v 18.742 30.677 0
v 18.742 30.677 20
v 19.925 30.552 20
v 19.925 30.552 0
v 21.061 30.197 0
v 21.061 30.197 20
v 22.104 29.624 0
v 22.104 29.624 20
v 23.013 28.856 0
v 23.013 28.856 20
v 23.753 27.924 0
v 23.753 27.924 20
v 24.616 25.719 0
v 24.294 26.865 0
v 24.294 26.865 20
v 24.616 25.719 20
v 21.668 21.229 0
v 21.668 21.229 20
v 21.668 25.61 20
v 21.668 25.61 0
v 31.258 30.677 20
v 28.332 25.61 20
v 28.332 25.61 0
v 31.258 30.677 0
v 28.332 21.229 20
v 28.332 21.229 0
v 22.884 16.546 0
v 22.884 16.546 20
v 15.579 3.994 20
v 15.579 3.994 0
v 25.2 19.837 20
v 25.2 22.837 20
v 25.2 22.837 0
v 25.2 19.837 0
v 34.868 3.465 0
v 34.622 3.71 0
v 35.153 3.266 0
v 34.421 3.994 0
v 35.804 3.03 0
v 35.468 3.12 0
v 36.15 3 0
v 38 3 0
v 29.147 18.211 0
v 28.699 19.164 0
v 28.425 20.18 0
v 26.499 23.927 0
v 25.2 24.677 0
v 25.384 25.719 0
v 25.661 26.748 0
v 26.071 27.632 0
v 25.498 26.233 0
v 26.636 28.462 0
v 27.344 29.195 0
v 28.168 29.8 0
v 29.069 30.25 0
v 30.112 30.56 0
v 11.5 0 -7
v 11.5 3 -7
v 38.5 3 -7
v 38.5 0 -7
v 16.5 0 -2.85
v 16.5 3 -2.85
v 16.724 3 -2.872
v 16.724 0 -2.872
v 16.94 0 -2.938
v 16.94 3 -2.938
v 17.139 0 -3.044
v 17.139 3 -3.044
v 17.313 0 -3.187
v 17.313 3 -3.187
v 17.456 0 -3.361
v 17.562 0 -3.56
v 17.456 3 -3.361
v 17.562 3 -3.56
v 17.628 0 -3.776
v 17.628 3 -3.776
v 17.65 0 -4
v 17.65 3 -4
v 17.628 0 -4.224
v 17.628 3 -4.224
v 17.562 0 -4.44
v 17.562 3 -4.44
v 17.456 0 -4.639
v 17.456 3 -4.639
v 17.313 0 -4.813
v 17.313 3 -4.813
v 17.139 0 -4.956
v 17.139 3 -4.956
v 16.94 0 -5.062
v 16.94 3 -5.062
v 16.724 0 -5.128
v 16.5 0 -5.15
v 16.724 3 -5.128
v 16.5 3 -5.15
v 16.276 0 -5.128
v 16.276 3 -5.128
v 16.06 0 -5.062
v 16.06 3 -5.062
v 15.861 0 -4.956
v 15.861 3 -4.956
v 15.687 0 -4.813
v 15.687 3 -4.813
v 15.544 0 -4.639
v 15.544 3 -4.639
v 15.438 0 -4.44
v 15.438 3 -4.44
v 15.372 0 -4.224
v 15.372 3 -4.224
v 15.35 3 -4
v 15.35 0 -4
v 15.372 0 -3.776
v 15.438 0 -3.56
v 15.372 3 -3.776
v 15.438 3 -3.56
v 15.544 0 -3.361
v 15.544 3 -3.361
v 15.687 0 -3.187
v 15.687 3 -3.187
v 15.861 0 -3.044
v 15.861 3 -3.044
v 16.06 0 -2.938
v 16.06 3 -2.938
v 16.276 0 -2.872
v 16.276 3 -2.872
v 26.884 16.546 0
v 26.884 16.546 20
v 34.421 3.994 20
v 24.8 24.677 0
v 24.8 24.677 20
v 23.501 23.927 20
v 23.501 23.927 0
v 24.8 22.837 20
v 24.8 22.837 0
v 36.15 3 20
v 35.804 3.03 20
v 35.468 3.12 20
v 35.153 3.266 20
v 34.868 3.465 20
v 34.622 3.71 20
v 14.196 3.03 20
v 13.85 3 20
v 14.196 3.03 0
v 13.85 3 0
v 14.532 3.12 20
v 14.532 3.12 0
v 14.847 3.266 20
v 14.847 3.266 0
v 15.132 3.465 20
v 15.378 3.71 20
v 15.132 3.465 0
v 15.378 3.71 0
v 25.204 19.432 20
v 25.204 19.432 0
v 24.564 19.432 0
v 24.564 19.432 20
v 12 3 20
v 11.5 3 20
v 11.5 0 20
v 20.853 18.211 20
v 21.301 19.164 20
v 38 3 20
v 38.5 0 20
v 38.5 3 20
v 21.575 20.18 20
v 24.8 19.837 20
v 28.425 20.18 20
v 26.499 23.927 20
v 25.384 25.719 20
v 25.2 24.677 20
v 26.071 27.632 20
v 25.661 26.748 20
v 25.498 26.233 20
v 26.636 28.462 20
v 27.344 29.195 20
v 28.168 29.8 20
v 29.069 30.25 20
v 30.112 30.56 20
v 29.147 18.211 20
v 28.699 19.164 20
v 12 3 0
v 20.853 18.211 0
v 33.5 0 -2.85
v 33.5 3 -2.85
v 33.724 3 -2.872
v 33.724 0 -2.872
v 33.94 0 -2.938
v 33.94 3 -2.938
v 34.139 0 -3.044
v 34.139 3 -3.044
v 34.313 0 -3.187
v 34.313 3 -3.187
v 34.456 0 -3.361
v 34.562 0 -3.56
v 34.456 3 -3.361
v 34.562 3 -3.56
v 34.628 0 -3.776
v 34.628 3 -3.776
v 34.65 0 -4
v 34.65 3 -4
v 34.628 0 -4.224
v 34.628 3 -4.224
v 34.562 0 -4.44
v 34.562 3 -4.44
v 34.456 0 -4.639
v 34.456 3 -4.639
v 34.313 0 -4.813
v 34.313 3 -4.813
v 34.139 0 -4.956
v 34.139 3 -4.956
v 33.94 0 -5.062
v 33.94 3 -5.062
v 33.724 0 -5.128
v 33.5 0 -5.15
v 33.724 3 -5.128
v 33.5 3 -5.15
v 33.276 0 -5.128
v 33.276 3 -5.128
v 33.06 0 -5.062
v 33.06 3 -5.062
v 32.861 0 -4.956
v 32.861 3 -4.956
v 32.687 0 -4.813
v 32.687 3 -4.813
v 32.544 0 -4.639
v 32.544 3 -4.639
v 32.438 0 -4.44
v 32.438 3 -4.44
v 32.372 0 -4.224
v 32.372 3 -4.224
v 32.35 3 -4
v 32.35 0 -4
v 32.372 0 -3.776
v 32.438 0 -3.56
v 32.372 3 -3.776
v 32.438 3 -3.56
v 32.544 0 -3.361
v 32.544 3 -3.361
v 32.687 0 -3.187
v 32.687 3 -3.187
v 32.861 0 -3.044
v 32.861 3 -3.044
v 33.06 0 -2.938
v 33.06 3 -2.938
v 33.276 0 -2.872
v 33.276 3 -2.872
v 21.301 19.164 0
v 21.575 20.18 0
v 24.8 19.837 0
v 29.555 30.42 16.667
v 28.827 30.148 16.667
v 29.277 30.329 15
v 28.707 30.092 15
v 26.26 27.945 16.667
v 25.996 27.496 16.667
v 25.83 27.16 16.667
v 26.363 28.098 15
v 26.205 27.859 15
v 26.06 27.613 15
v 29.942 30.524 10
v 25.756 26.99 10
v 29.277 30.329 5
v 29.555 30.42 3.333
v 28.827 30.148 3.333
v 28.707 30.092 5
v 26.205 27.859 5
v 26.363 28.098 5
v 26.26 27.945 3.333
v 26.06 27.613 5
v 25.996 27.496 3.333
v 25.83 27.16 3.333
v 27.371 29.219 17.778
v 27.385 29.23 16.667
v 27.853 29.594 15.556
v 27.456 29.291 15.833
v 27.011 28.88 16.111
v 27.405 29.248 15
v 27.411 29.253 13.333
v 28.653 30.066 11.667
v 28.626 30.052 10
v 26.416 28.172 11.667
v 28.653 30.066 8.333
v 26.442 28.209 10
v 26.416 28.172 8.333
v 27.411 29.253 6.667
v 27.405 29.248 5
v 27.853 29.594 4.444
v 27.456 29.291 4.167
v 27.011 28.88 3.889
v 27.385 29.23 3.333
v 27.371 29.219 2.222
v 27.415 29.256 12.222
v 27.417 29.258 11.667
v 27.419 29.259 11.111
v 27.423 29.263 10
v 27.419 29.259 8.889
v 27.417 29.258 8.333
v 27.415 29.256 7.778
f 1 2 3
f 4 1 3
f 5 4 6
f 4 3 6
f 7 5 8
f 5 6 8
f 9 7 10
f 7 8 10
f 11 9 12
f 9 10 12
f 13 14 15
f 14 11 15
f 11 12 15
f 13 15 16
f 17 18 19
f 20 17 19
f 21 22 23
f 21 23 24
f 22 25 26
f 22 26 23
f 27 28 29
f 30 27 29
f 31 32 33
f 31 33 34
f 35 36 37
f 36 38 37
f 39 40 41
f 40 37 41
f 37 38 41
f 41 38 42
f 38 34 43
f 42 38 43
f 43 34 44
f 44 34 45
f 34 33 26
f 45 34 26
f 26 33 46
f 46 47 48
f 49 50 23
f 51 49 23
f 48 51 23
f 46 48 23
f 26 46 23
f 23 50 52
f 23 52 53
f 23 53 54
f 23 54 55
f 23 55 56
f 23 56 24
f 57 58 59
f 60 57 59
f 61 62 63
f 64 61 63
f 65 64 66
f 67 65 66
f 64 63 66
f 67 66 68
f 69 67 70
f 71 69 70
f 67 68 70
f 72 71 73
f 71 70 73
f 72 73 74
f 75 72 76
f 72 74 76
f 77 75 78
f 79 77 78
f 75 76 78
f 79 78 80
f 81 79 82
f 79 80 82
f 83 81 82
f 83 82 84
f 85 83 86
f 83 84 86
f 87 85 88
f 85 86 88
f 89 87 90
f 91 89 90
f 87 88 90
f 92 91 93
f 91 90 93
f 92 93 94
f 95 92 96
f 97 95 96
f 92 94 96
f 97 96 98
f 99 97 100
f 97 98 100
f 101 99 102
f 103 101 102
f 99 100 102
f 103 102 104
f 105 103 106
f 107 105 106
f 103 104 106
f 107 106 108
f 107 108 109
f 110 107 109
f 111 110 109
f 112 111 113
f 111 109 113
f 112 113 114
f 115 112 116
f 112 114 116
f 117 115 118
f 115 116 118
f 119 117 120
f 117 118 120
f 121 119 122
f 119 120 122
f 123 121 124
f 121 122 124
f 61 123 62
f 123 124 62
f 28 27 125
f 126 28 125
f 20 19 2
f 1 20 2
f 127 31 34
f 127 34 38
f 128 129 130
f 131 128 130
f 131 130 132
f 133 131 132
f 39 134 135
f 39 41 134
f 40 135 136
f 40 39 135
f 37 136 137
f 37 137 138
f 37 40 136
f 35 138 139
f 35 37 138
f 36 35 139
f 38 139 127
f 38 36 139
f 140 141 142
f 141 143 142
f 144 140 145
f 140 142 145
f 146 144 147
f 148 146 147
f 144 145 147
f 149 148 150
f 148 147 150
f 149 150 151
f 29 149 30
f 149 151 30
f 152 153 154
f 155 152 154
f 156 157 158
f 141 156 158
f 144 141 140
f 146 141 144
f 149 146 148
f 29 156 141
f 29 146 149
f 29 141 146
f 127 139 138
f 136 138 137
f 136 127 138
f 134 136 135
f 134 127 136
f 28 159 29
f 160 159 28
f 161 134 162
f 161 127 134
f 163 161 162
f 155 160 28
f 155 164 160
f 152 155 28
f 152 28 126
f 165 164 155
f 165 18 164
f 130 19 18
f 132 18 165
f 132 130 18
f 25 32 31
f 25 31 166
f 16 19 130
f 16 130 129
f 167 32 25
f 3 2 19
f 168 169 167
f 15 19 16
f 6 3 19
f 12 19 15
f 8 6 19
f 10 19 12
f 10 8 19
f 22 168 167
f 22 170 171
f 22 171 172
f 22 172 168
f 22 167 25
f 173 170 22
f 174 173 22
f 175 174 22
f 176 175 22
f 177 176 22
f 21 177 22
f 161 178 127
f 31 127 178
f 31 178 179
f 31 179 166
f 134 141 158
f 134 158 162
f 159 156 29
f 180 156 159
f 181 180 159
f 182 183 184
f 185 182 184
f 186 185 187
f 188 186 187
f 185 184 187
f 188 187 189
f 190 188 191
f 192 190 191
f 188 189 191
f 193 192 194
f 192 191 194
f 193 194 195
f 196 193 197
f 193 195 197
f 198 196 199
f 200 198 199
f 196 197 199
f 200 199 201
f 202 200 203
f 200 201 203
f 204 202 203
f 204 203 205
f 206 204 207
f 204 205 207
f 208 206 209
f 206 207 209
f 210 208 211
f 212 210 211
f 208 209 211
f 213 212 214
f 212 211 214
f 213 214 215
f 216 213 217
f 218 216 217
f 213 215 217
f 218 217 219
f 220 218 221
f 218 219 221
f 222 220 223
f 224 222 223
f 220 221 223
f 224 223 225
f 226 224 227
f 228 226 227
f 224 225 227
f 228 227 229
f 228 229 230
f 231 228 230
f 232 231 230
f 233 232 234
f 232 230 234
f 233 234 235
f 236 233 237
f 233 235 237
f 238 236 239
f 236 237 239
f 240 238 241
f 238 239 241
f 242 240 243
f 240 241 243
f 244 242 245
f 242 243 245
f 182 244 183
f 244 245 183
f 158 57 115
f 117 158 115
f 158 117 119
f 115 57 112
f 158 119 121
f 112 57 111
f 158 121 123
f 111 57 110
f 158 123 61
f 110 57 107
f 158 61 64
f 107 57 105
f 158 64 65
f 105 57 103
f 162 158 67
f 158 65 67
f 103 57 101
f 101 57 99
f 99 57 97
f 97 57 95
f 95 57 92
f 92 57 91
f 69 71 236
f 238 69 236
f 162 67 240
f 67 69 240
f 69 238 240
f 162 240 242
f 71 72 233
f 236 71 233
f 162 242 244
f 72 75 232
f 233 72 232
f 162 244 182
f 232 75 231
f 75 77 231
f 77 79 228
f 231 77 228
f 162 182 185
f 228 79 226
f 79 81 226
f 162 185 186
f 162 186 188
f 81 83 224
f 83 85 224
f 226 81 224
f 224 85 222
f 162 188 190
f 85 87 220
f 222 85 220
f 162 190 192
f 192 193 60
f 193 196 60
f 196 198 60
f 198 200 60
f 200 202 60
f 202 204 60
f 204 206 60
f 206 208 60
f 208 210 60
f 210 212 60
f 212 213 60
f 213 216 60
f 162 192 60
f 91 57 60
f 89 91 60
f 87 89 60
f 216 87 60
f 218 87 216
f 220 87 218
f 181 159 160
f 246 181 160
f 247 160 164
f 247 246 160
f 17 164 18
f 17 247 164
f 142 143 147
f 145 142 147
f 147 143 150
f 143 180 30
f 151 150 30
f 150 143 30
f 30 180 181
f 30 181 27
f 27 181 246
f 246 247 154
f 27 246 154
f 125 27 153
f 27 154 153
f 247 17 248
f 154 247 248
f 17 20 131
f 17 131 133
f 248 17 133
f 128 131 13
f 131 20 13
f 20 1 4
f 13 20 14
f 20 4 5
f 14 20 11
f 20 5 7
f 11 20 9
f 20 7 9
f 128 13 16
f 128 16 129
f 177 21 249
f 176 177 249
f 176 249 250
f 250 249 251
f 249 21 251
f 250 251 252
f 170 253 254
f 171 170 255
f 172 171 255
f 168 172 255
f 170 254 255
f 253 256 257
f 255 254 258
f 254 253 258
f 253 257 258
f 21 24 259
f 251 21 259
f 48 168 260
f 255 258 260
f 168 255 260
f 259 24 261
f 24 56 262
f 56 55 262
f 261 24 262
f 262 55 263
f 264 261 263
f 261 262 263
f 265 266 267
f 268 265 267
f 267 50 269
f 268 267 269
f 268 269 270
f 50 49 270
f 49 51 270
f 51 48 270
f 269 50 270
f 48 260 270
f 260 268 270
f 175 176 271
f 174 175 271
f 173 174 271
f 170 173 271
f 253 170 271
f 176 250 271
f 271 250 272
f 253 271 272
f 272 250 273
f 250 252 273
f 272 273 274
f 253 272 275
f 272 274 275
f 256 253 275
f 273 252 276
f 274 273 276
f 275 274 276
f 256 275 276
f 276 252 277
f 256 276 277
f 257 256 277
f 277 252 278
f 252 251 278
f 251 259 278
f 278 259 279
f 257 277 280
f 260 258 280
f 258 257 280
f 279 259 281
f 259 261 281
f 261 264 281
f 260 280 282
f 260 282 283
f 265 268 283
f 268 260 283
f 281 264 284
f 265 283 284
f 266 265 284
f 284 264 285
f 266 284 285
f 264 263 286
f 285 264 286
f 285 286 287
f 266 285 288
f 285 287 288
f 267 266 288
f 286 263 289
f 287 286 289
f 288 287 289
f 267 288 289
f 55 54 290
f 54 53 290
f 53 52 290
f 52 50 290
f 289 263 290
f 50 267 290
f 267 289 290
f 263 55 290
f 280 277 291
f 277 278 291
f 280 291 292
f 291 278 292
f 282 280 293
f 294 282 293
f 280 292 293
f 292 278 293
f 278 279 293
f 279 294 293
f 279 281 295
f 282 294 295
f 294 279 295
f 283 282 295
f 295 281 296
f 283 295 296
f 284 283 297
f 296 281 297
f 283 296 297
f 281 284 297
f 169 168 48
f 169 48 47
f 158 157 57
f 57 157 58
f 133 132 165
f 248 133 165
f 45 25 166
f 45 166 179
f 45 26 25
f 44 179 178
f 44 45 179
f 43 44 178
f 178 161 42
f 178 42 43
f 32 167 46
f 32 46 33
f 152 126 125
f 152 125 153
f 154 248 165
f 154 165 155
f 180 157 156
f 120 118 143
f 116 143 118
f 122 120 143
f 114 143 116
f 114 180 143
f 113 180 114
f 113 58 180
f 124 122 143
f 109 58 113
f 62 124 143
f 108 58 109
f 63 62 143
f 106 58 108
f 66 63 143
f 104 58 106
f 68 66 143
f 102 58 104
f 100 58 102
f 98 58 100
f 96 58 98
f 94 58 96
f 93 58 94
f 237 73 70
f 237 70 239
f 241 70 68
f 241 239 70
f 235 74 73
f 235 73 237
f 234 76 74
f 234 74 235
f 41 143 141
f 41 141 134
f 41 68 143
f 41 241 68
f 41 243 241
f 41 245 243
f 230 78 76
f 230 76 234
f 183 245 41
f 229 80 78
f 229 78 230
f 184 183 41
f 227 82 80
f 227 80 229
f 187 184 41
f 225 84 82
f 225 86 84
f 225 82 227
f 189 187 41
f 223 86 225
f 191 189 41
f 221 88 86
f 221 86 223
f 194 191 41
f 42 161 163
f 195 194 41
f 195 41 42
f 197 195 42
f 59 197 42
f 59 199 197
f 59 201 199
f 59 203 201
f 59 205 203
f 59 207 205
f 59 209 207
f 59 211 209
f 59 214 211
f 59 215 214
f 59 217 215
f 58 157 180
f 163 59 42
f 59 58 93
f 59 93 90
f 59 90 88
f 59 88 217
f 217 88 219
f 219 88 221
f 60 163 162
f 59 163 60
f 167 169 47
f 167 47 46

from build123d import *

# Parameters (mm, degrees)
SCHIZZO1_W                     = 50
SCHIZZO1_H                     = 3
ESTRUSIONE_ESTRUSIONE1_DEPTH   = 20
ESTRUSIONE_ESTRUSIONE2_DEPTH   = 20
ESTRUSIONE_ESTRUSIONE2_2_DEPTH = 20
RACCORDO2_R                    = 6
RACCORDO3_DEPTH                = 20
RACCORDO4_R                    = 6
RACCORDO5_R                    = 6
RACCORDO7_R                    = 2
RACCORDO8_R                    = 2
SCHIZZO5_W                     = 11.5
SCHIZZO5_H                     = 20
TAGLIO_ESTRUSIONE2_DEPTH       = 3
ESTRUSIONE_ESTRUSIONE7_DEPTH   = 20
SCHIZZO12_W                    = 27
SCHIZZO12_H                    = 7
SCHIZZO12_R                    = 1.15
ESTRUSIONE_ESTRUSIONE9_DEPTH   = 3


with BuildPart() as part:
    # Schizzo1 → Estrusione-Estrusione1 (new body)
    with BuildSketch(Plane.XY):
        with Locations((25, 1.5)):
            Rectangle(SCHIZZO1_W, SCHIZZO1_H)
    extrude(amount=ESTRUSIONE_ESTRUSIONE1_DEPTH)

    # Schizzo5 → Taglio-Estrusione2 (cut)
    with BuildSketch(Plane(origin=(0, 3, 0), x_dir=(1, 0, 0), z_dir=(0, 1, 0))):
        with Locations((5.75, -10)):
            Rectangle(SCHIZZO5_W, SCHIZZO5_H)
        with Locations((44.25, -10)):
            Rectangle(SCHIZZO5_W, SCHIZZO5_H)
    extrude(amount=-TAGLIO_ESTRUSIONE2_DEPTH, mode=Mode.SUBTRACT)



with BuildPart() as body_2:
    # Schizzo2 → Estrusione-Estrusione2 (new body)
    with BuildSketch(Plane.XY.offset(20)):
        Polygon((12, 3), (21.667680152, 19.610006491), (21.667680152, 25.610006491), (18.742038116, 30.677367142), (23.742038116, 30.677367142), (24.8, 24.677367142), (23.500961894, 23.927367142), (24.8, 22.837344747), (24.8, 19.837344747), (15, 3), align=None)
    extrude(amount=-ESTRUSIONE_ESTRUSIONE2_DEPTH)

    # Raccordo2
    # the kernel refuses this fillet: 6 mm, written as the material it takes off along each edge
    with BuildSketch(Plane(origin=(23.742038116, 30.677367142, 32.586494468), x_dir=(-1, 0, 0), z_dir=(0, 0, -1))) as raccordo2_piece_1:
        with BuildLine():
            CenterArc((RACCORDO2_R * 0.839099631177, -RACCORDO2_R), RACCORDO2_R, 90, 80)
            Line((-RACCORDO2_R * 0.145708121835, -RACCORDO2_R * 0.826351822333), (0, 0))
            Line((0, 0), (RACCORDO2_R * 0.839099631177, 0))
        make_face()
    extrude(amount=45.172988935, mode=Mode.SUBTRACT)

    # Raccordo5
    raccordo5_edges = [body_2.edges().sort_by_distance(p)[0] for p in [
        (21.667680152, 19.610006491, 10),
    ]]
    fillet(raccordo5_edges, radius=RACCORDO5_R)

    # Raccordo8
    raccordo8_edges = [body_2.edges().sort_by_distance(p)[0] for p in [
        (15, 3, 10),
    ]]
    fillet(raccordo8_edges, radius=RACCORDO8_R)

    # Schizzo9 → Estrusione-Estrusione7 (add)
    with BuildSketch(Plane.XY.offset(20)):
        Polygon((24.564100135, 19.432046037), (22.884294771, 16.545978484), (26.884294771, 16.545978484), (25.204489408, 19.432046037), align=None)
    extrude(amount=-ESTRUSIONE_ESTRUSIONE7_DEPTH)


with BuildPart() as body_3:
    # Schizzo2 → Estrusione-Estrusione2 2 (new body)
    with BuildSketch(Plane.XY.offset(20)):
        Polygon((26.499038106, 23.927367142), (25.2, 22.837344747), (25.2, 19.837344747), (35, 3), (38, 3), (28.332319848, 19.610006491), (28.332319848, 25.610006491), (31.257961884, 30.677367142), (26.257961884, 30.677367142), (25.2, 24.677367142), align=None)
    extrude(amount=-ESTRUSIONE_ESTRUSIONE2_2_DEPTH)

    # Raccordo3: read off the stored shape, not the designer's step
    # Raccordo3 outline → Raccordo3 (cut)
    with BuildSketch(Plane.XY):
        with BuildLine():
            add(Edge.make_bspline(
                [(31.257961884, 30.677367142), (26.252870263, 30.648491125), (25.38373076, 25.719356061)],
                knots=[0, 0, 0, 1, 1, 1], degree=2, weights=[1, 0.767895459, 1]))
            Line((31.257961884, 30.677367142), (26.257961884, 30.677367142))
            Line((26.257961884, 30.677367142), (25.38373076, 25.719356061))
        make_face()
    extrude(amount=RACCORDO3_DEPTH, mode=Mode.SUBTRACT)

    # Raccordo4
    raccordo4_edges = [body_3.edges().sort_by_distance(p)[0] for p in [
        (28.332319848, 19.610006491, 10),
    ]]
    fillet(raccordo4_edges, radius=RACCORDO4_R)

    # Raccordo7
    raccordo7_edges = [body_3.edges().sort_by_distance(p)[0] for p in [
        (35, 3, 10),
    ]]
    fillet(raccordo7_edges, radius=RACCORDO7_R)


with BuildPart() as part_1:
    add(part.part)

    add(body_2.part)  # Estrusione-Estrusione9 merges body 2

    add(body_3.part)  # Estrusione-Estrusione9 merges body 3
    # Schizzo12 → Estrusione-Estrusione9 (add)
    with BuildSketch(Plane(origin=(0, 3, 0), x_dir=(1, 0, 0), z_dir=(0, 1, 0))):
        with Locations((25, 3.5)):
            Rectangle(SCHIZZO12_W, SCHIZZO12_H)
        with Locations(Location((16.5, 4, 0), (0, 0, 270))):
            Circle(SCHIZZO12_R, mode=Mode.SUBTRACT)
        with Locations(Location((33.5, 4, 0), (0, 0, 270))):
            Circle(SCHIZZO12_R, mode=Mode.SUBTRACT)
    extrude(amount=-ESTRUSIONE_ESTRUSIONE9_DEPTH)


solid = part_1.part
